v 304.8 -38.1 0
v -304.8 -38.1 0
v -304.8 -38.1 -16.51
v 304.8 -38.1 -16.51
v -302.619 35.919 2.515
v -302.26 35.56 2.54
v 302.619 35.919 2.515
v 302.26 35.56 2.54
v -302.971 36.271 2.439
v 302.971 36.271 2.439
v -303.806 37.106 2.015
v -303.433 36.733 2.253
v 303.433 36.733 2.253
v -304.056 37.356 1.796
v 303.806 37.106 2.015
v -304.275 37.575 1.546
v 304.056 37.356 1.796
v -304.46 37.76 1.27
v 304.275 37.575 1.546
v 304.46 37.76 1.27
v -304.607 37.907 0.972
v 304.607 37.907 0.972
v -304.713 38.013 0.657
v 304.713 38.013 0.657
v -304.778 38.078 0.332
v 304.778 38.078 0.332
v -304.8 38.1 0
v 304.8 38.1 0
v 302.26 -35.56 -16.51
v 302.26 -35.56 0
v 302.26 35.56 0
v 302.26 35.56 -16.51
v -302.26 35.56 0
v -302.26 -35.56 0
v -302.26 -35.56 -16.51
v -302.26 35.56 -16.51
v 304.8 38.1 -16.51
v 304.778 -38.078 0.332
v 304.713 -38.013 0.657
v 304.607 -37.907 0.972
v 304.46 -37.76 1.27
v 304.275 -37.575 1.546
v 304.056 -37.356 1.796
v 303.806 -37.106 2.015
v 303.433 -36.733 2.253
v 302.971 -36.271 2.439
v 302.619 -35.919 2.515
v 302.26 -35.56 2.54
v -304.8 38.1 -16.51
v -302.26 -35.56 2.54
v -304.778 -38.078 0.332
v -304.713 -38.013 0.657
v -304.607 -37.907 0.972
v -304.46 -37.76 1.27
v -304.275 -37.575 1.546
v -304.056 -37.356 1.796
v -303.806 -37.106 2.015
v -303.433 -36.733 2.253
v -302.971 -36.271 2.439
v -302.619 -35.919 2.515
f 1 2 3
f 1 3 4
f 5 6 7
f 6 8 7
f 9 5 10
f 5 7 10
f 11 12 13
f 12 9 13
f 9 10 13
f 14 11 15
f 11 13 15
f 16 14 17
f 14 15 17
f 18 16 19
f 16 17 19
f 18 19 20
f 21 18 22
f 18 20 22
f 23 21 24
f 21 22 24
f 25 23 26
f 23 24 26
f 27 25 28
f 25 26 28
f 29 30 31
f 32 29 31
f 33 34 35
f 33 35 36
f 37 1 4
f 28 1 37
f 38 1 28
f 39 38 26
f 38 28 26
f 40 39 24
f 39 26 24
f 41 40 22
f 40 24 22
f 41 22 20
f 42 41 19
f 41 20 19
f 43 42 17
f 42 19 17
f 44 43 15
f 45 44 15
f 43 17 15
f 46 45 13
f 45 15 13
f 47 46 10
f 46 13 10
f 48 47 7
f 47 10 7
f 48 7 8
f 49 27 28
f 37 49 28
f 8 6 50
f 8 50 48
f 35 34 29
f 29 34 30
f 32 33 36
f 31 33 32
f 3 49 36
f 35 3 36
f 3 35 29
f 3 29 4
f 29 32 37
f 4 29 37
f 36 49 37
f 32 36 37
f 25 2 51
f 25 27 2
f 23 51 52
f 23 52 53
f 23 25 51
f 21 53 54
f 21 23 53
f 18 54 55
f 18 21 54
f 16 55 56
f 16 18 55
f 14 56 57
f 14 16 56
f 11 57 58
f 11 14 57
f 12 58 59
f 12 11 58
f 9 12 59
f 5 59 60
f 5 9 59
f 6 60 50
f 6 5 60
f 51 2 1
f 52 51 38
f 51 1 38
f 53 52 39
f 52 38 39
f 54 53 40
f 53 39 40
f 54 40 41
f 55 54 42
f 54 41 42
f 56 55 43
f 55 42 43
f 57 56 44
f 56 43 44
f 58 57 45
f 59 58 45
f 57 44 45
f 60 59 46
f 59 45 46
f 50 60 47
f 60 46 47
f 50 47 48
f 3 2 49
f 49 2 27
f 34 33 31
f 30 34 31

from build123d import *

# Parameters (mm, degrees)
SKETCH1_W           = 609.6
SKETCH1_H           = 76.2
BOSS_EXTRUDE1_DEPTH = 2.54
SKETCH2_W           = 609.6
SKETCH2_H           = 76.2
SKETCH2_W_2         = 604.52
SKETCH2_H_2         = 71.12
BOSS_EXTRUDE2_DEPTH = 19.05
FILLET1_R           = 2.54


with BuildPart() as part:
    # Sketch1 → Boss-Extrude1 (new body)
    with BuildSketch(Plane.XY):
        Rectangle(SKETCH1_W, SKETCH1_H)
    extrude(amount=BOSS_EXTRUDE1_DEPTH)

    # Sketch2 → Boss-Extrude2 (add)
    with BuildSketch(Plane.XY.offset(2.54)):
        Rectangle(SKETCH2_W, SKETCH2_H)
        Rectangle(SKETCH2_W_2, SKETCH2_H_2, mode=Mode.SUBTRACT)
    extrude(amount=-BOSS_EXTRUDE2_DEPTH)

    # Fillet1
    fillet1_edges = [part.edges().sort_by_distance(p)[0] for p in [
        (-304.8, 0, 2.54),
        (0, -38.1, 2.54),
        (304.8, 0, 2.54),
        (0, 38.1, 2.54),
    ]]
    fillet(fillet1_edges, radius=FILLET1_R)


solid = part.part
